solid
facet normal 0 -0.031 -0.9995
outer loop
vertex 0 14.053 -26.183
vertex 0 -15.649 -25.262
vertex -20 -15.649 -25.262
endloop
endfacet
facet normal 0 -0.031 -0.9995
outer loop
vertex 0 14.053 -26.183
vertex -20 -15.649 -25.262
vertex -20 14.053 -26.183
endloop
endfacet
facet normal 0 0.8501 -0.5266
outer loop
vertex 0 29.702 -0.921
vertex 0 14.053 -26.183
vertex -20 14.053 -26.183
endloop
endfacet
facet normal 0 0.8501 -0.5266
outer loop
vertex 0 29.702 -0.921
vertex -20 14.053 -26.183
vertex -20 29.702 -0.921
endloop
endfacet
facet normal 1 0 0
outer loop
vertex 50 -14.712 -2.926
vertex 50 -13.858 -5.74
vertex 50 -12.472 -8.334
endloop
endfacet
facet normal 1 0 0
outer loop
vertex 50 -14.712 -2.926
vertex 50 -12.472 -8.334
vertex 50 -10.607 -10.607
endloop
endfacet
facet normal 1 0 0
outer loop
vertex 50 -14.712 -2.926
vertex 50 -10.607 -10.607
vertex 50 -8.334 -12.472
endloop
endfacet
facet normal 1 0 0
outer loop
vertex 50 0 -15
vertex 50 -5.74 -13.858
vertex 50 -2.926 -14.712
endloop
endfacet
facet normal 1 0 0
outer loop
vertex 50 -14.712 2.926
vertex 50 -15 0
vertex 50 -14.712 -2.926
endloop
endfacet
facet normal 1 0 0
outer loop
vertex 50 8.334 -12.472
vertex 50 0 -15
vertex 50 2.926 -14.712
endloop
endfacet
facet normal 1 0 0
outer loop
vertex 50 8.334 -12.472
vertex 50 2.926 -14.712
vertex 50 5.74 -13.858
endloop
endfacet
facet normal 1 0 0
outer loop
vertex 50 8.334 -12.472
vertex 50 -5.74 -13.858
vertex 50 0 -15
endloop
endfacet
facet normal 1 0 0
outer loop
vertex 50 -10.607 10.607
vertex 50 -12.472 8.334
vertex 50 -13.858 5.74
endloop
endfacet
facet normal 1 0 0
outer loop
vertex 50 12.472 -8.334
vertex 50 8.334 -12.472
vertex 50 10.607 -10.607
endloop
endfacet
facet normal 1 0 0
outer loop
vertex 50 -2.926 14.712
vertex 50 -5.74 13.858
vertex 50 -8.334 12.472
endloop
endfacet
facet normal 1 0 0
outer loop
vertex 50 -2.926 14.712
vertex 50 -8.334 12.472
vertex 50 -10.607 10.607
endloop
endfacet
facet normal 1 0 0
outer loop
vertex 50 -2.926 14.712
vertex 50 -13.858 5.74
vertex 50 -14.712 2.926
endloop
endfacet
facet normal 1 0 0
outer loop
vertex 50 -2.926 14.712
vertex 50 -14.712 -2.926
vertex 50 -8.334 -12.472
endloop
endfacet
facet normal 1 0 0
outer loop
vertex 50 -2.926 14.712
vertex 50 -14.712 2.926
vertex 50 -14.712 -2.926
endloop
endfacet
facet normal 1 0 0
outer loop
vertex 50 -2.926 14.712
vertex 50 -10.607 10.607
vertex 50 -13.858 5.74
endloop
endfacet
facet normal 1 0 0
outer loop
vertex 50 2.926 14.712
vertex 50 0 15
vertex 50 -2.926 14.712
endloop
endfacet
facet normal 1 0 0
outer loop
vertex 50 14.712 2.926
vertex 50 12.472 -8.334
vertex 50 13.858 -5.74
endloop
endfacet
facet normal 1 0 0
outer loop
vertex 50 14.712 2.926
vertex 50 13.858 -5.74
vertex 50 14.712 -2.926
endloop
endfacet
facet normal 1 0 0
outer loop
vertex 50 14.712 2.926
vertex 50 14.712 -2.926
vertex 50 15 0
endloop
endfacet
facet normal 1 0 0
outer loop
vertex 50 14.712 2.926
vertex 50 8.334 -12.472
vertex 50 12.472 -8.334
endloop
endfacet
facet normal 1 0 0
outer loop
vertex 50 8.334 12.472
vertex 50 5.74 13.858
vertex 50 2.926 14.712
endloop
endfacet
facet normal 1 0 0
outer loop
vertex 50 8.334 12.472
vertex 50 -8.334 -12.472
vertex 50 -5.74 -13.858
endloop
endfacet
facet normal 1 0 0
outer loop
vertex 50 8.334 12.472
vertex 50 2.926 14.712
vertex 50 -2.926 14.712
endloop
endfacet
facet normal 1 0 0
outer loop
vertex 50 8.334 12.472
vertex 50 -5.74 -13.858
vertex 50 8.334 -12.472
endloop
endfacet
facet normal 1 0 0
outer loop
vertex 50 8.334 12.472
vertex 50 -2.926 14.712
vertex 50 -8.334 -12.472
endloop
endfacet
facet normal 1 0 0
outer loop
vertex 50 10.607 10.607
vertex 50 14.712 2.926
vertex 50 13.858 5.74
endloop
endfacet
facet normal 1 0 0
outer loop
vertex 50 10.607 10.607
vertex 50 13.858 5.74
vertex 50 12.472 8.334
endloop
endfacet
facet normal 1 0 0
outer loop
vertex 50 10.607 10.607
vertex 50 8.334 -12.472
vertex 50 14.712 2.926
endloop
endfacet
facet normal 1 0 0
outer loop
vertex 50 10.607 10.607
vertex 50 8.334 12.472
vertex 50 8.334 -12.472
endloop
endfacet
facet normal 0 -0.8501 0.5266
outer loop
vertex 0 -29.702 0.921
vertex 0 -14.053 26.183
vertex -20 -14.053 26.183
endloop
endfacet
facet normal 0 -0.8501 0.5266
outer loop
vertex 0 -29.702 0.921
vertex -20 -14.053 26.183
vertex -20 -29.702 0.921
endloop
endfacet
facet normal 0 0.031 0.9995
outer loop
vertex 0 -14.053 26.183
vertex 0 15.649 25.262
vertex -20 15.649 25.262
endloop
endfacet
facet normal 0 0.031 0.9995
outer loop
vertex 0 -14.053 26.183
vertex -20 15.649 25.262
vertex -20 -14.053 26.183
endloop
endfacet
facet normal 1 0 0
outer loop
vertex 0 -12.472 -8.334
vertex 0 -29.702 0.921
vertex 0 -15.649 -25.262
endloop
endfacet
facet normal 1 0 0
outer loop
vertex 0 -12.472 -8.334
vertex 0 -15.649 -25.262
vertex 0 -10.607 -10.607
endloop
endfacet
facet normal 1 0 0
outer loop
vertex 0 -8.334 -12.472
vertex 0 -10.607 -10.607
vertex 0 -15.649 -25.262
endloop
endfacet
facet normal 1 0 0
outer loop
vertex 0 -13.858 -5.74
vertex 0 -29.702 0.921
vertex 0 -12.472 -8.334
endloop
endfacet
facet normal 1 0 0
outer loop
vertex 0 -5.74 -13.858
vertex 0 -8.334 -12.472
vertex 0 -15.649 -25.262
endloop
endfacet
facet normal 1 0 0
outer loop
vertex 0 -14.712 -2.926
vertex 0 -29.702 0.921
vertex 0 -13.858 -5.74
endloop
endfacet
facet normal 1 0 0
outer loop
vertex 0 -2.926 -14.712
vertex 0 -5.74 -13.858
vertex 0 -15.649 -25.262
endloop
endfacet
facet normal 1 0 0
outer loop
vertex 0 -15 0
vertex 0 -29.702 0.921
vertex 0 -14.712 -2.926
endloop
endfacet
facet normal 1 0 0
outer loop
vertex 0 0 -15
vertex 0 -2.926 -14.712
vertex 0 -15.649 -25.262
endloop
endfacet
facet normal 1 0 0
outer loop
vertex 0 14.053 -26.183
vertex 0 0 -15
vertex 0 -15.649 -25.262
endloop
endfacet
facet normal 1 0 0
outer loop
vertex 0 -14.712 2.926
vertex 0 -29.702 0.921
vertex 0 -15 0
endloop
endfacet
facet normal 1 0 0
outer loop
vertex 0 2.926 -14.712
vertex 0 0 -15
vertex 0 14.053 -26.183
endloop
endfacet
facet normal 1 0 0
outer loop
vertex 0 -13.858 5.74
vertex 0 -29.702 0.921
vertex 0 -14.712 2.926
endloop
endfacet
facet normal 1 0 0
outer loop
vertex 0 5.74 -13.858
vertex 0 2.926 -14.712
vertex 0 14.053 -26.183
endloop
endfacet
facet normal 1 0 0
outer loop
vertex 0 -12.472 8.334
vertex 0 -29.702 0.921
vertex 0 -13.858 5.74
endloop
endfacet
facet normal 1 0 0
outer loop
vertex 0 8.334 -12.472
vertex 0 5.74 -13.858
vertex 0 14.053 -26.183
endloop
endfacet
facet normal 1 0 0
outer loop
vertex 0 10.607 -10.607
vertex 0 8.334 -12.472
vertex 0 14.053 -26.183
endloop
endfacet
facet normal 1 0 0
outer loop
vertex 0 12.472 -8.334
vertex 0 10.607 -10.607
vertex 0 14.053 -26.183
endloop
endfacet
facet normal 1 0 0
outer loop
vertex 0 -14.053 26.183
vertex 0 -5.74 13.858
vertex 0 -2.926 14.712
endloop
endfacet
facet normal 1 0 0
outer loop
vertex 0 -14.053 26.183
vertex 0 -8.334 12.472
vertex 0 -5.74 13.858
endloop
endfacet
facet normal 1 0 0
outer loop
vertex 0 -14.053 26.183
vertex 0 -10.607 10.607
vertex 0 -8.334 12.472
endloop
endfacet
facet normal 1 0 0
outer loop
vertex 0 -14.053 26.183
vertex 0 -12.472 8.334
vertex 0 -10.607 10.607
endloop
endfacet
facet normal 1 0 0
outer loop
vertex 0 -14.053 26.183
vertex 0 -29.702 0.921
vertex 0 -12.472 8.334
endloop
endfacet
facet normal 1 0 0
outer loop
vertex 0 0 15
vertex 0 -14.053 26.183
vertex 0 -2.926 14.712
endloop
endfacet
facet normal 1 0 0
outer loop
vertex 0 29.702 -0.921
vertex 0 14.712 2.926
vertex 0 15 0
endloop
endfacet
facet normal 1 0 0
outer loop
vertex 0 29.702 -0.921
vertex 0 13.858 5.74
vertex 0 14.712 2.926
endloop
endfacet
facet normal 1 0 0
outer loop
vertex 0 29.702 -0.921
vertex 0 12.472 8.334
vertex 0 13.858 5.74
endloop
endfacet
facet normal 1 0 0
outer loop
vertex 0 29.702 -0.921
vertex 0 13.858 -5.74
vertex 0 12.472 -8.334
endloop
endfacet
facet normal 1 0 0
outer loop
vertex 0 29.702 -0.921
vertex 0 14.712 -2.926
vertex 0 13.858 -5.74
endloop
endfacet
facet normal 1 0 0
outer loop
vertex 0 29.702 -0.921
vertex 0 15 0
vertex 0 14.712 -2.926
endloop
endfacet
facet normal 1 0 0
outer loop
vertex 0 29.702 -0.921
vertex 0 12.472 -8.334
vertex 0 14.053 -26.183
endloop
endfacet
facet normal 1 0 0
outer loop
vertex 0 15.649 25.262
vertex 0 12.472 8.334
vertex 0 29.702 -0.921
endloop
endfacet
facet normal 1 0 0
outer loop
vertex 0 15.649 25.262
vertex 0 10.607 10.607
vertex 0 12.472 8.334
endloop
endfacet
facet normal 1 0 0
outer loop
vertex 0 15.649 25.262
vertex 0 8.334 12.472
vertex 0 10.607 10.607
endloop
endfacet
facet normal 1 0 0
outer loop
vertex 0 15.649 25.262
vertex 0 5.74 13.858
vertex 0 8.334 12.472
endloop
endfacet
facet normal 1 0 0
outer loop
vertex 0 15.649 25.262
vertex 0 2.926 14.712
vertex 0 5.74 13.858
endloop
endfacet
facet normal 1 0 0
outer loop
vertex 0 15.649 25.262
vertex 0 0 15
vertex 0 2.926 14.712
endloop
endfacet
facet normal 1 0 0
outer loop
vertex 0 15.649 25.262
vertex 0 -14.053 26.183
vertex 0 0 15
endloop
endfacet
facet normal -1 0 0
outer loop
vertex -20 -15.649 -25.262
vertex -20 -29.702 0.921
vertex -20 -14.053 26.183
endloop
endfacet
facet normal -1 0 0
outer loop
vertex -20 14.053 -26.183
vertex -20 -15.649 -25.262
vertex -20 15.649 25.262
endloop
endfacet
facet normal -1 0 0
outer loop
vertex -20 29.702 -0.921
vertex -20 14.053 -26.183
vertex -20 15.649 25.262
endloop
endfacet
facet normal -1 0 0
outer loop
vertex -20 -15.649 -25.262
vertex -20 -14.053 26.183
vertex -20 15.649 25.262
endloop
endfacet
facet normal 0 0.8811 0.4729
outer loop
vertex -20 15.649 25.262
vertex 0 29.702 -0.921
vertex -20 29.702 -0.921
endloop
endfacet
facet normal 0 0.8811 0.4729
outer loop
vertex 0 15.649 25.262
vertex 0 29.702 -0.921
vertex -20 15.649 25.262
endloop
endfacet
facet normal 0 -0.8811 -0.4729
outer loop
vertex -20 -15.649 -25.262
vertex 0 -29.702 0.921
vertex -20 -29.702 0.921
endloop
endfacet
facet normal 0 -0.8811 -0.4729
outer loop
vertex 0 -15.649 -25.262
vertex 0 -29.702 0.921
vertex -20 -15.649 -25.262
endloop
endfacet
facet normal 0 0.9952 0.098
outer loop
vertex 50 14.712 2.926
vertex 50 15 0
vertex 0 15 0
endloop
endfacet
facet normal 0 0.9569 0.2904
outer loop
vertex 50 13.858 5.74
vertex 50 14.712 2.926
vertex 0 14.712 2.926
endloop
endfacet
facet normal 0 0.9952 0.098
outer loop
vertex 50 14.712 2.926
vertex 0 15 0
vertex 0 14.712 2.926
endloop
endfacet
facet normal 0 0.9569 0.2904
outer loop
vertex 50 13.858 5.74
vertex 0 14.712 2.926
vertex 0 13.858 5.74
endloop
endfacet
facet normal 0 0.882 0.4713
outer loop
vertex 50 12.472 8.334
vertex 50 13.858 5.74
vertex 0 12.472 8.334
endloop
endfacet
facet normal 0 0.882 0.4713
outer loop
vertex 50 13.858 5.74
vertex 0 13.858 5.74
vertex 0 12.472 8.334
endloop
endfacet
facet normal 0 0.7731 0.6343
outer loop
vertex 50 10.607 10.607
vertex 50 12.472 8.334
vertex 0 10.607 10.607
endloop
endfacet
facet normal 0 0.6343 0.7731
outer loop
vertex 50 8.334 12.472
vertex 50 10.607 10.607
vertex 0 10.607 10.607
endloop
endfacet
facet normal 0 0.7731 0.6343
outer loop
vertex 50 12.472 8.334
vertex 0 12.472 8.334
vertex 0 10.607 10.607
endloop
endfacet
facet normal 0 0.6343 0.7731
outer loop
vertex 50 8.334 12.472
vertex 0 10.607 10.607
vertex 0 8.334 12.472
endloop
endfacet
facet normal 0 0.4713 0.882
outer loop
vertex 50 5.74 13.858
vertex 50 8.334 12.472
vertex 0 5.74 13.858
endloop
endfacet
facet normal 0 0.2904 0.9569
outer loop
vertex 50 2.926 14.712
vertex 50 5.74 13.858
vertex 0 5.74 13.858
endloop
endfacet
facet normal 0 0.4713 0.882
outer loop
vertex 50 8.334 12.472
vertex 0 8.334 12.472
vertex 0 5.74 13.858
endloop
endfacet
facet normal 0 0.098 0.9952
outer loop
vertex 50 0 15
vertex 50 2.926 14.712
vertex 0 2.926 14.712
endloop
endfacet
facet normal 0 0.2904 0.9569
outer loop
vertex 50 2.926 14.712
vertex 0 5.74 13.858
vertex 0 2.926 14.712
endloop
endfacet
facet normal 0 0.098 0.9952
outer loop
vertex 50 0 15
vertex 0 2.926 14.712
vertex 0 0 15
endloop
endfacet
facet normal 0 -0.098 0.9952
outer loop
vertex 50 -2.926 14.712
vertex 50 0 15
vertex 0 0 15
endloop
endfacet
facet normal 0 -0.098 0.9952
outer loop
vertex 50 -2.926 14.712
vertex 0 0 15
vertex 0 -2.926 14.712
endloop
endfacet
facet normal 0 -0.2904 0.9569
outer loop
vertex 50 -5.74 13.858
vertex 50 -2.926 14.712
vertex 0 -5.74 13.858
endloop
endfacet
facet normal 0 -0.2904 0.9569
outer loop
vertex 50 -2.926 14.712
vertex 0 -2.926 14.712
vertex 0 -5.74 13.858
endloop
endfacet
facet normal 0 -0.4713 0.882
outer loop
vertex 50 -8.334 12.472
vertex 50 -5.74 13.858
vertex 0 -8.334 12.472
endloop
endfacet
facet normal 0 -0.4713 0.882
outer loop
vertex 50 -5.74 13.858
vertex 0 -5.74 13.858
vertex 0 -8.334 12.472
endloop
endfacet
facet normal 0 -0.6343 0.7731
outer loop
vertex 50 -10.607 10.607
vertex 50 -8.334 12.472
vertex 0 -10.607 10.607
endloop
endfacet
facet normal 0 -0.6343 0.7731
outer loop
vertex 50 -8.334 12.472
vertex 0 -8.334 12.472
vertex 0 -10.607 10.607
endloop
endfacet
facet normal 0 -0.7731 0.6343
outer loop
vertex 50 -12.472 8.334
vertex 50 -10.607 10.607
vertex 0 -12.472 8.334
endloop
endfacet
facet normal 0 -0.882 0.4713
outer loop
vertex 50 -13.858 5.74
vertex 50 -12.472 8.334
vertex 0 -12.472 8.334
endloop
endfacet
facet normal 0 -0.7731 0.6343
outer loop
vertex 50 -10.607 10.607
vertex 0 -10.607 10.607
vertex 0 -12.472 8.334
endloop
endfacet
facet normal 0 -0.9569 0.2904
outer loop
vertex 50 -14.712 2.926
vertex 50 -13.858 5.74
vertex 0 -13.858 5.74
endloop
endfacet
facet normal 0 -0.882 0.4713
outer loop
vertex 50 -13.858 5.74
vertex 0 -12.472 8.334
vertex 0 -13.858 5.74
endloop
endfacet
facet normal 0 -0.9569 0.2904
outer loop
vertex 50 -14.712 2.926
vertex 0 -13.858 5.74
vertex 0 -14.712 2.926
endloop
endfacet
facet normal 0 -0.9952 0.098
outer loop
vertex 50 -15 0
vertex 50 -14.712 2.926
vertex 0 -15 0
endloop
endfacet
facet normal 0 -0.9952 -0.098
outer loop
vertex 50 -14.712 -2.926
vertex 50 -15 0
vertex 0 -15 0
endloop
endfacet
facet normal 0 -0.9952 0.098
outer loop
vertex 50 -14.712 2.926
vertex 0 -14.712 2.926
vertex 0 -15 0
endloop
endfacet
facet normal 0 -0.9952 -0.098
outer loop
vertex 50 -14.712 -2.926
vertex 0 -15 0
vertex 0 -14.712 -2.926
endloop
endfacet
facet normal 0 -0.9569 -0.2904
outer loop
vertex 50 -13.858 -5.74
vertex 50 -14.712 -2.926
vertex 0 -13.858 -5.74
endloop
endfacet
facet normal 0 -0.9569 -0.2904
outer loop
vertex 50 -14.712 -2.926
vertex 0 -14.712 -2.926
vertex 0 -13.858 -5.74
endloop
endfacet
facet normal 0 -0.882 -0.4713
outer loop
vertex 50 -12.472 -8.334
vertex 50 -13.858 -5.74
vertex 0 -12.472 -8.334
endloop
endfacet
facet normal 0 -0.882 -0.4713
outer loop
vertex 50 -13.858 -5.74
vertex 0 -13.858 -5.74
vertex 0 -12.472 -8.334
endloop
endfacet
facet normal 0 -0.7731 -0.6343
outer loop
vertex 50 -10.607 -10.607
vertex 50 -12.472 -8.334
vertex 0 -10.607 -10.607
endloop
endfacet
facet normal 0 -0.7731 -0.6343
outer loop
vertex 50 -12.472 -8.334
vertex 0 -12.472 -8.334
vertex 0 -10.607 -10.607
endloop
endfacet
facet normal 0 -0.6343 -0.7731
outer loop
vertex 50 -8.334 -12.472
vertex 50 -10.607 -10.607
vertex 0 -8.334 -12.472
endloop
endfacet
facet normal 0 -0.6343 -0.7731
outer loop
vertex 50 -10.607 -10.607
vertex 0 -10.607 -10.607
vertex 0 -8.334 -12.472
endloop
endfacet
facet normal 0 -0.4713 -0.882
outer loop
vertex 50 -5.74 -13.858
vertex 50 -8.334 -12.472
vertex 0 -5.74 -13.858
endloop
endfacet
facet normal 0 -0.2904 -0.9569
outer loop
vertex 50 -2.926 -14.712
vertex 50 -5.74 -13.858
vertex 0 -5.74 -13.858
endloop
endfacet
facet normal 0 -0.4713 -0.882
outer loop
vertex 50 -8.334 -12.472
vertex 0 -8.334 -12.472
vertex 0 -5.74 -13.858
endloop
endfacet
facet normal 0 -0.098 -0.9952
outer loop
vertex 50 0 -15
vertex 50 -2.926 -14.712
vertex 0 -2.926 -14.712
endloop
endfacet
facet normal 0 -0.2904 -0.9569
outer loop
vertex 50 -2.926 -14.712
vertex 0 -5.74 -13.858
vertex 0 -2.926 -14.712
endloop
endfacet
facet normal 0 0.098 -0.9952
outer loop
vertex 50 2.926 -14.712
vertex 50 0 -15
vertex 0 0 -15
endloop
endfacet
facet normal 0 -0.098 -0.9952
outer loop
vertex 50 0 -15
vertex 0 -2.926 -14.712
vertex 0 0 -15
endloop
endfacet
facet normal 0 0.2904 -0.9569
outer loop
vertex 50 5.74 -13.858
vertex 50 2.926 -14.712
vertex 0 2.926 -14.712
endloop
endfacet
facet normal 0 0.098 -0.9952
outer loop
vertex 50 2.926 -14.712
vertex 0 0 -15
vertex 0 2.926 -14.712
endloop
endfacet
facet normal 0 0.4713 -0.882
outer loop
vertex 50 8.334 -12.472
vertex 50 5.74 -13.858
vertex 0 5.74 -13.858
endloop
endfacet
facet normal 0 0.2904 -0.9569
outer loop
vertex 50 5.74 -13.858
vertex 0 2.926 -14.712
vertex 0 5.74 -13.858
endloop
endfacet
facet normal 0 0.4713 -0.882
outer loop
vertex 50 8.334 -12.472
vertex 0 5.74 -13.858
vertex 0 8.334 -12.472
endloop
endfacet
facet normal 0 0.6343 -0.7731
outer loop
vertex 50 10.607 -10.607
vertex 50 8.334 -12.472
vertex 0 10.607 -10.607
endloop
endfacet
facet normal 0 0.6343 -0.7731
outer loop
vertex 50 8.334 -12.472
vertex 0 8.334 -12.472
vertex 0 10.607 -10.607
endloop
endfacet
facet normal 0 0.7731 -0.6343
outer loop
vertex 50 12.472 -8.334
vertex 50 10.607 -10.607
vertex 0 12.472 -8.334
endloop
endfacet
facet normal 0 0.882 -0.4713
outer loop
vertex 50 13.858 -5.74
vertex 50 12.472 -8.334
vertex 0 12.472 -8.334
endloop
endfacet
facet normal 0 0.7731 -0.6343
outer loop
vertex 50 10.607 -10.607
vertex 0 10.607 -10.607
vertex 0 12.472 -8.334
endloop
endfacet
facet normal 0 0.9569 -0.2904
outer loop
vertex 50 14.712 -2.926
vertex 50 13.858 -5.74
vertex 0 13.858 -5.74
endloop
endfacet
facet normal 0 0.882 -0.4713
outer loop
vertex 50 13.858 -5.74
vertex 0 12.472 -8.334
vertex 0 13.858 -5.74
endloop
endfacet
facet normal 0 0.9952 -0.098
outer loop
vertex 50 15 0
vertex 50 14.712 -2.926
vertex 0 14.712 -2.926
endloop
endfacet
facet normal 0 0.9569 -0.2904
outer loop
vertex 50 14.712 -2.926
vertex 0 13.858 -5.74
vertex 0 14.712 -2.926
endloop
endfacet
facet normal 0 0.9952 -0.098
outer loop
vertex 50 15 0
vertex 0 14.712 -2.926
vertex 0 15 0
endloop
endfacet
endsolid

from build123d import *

# Parameters (mm, degrees)
F1_DEPTH = 20
F2_R     = 15
F3_DEPTH = 50


with BuildPart() as f1:
    # F0 (on Right) → F1 (new body)
    with BuildSketch(Plane.YZ):
        Polygon((-15.648834, -25.261711), (14.052867, -26.183143), (29.701701, -0.921432), (15.648834, 25.261711), (-14.052867, 26.183143), (-29.701701, 0.921432), align=None)
    extrude(amount=-F1_DEPTH)

    # F2 (on face) → F3 (join)
    with BuildSketch(Plane.YZ):
        Circle(F2_R)
    extrude(amount=F3_DEPTH)


solid = f1.part
